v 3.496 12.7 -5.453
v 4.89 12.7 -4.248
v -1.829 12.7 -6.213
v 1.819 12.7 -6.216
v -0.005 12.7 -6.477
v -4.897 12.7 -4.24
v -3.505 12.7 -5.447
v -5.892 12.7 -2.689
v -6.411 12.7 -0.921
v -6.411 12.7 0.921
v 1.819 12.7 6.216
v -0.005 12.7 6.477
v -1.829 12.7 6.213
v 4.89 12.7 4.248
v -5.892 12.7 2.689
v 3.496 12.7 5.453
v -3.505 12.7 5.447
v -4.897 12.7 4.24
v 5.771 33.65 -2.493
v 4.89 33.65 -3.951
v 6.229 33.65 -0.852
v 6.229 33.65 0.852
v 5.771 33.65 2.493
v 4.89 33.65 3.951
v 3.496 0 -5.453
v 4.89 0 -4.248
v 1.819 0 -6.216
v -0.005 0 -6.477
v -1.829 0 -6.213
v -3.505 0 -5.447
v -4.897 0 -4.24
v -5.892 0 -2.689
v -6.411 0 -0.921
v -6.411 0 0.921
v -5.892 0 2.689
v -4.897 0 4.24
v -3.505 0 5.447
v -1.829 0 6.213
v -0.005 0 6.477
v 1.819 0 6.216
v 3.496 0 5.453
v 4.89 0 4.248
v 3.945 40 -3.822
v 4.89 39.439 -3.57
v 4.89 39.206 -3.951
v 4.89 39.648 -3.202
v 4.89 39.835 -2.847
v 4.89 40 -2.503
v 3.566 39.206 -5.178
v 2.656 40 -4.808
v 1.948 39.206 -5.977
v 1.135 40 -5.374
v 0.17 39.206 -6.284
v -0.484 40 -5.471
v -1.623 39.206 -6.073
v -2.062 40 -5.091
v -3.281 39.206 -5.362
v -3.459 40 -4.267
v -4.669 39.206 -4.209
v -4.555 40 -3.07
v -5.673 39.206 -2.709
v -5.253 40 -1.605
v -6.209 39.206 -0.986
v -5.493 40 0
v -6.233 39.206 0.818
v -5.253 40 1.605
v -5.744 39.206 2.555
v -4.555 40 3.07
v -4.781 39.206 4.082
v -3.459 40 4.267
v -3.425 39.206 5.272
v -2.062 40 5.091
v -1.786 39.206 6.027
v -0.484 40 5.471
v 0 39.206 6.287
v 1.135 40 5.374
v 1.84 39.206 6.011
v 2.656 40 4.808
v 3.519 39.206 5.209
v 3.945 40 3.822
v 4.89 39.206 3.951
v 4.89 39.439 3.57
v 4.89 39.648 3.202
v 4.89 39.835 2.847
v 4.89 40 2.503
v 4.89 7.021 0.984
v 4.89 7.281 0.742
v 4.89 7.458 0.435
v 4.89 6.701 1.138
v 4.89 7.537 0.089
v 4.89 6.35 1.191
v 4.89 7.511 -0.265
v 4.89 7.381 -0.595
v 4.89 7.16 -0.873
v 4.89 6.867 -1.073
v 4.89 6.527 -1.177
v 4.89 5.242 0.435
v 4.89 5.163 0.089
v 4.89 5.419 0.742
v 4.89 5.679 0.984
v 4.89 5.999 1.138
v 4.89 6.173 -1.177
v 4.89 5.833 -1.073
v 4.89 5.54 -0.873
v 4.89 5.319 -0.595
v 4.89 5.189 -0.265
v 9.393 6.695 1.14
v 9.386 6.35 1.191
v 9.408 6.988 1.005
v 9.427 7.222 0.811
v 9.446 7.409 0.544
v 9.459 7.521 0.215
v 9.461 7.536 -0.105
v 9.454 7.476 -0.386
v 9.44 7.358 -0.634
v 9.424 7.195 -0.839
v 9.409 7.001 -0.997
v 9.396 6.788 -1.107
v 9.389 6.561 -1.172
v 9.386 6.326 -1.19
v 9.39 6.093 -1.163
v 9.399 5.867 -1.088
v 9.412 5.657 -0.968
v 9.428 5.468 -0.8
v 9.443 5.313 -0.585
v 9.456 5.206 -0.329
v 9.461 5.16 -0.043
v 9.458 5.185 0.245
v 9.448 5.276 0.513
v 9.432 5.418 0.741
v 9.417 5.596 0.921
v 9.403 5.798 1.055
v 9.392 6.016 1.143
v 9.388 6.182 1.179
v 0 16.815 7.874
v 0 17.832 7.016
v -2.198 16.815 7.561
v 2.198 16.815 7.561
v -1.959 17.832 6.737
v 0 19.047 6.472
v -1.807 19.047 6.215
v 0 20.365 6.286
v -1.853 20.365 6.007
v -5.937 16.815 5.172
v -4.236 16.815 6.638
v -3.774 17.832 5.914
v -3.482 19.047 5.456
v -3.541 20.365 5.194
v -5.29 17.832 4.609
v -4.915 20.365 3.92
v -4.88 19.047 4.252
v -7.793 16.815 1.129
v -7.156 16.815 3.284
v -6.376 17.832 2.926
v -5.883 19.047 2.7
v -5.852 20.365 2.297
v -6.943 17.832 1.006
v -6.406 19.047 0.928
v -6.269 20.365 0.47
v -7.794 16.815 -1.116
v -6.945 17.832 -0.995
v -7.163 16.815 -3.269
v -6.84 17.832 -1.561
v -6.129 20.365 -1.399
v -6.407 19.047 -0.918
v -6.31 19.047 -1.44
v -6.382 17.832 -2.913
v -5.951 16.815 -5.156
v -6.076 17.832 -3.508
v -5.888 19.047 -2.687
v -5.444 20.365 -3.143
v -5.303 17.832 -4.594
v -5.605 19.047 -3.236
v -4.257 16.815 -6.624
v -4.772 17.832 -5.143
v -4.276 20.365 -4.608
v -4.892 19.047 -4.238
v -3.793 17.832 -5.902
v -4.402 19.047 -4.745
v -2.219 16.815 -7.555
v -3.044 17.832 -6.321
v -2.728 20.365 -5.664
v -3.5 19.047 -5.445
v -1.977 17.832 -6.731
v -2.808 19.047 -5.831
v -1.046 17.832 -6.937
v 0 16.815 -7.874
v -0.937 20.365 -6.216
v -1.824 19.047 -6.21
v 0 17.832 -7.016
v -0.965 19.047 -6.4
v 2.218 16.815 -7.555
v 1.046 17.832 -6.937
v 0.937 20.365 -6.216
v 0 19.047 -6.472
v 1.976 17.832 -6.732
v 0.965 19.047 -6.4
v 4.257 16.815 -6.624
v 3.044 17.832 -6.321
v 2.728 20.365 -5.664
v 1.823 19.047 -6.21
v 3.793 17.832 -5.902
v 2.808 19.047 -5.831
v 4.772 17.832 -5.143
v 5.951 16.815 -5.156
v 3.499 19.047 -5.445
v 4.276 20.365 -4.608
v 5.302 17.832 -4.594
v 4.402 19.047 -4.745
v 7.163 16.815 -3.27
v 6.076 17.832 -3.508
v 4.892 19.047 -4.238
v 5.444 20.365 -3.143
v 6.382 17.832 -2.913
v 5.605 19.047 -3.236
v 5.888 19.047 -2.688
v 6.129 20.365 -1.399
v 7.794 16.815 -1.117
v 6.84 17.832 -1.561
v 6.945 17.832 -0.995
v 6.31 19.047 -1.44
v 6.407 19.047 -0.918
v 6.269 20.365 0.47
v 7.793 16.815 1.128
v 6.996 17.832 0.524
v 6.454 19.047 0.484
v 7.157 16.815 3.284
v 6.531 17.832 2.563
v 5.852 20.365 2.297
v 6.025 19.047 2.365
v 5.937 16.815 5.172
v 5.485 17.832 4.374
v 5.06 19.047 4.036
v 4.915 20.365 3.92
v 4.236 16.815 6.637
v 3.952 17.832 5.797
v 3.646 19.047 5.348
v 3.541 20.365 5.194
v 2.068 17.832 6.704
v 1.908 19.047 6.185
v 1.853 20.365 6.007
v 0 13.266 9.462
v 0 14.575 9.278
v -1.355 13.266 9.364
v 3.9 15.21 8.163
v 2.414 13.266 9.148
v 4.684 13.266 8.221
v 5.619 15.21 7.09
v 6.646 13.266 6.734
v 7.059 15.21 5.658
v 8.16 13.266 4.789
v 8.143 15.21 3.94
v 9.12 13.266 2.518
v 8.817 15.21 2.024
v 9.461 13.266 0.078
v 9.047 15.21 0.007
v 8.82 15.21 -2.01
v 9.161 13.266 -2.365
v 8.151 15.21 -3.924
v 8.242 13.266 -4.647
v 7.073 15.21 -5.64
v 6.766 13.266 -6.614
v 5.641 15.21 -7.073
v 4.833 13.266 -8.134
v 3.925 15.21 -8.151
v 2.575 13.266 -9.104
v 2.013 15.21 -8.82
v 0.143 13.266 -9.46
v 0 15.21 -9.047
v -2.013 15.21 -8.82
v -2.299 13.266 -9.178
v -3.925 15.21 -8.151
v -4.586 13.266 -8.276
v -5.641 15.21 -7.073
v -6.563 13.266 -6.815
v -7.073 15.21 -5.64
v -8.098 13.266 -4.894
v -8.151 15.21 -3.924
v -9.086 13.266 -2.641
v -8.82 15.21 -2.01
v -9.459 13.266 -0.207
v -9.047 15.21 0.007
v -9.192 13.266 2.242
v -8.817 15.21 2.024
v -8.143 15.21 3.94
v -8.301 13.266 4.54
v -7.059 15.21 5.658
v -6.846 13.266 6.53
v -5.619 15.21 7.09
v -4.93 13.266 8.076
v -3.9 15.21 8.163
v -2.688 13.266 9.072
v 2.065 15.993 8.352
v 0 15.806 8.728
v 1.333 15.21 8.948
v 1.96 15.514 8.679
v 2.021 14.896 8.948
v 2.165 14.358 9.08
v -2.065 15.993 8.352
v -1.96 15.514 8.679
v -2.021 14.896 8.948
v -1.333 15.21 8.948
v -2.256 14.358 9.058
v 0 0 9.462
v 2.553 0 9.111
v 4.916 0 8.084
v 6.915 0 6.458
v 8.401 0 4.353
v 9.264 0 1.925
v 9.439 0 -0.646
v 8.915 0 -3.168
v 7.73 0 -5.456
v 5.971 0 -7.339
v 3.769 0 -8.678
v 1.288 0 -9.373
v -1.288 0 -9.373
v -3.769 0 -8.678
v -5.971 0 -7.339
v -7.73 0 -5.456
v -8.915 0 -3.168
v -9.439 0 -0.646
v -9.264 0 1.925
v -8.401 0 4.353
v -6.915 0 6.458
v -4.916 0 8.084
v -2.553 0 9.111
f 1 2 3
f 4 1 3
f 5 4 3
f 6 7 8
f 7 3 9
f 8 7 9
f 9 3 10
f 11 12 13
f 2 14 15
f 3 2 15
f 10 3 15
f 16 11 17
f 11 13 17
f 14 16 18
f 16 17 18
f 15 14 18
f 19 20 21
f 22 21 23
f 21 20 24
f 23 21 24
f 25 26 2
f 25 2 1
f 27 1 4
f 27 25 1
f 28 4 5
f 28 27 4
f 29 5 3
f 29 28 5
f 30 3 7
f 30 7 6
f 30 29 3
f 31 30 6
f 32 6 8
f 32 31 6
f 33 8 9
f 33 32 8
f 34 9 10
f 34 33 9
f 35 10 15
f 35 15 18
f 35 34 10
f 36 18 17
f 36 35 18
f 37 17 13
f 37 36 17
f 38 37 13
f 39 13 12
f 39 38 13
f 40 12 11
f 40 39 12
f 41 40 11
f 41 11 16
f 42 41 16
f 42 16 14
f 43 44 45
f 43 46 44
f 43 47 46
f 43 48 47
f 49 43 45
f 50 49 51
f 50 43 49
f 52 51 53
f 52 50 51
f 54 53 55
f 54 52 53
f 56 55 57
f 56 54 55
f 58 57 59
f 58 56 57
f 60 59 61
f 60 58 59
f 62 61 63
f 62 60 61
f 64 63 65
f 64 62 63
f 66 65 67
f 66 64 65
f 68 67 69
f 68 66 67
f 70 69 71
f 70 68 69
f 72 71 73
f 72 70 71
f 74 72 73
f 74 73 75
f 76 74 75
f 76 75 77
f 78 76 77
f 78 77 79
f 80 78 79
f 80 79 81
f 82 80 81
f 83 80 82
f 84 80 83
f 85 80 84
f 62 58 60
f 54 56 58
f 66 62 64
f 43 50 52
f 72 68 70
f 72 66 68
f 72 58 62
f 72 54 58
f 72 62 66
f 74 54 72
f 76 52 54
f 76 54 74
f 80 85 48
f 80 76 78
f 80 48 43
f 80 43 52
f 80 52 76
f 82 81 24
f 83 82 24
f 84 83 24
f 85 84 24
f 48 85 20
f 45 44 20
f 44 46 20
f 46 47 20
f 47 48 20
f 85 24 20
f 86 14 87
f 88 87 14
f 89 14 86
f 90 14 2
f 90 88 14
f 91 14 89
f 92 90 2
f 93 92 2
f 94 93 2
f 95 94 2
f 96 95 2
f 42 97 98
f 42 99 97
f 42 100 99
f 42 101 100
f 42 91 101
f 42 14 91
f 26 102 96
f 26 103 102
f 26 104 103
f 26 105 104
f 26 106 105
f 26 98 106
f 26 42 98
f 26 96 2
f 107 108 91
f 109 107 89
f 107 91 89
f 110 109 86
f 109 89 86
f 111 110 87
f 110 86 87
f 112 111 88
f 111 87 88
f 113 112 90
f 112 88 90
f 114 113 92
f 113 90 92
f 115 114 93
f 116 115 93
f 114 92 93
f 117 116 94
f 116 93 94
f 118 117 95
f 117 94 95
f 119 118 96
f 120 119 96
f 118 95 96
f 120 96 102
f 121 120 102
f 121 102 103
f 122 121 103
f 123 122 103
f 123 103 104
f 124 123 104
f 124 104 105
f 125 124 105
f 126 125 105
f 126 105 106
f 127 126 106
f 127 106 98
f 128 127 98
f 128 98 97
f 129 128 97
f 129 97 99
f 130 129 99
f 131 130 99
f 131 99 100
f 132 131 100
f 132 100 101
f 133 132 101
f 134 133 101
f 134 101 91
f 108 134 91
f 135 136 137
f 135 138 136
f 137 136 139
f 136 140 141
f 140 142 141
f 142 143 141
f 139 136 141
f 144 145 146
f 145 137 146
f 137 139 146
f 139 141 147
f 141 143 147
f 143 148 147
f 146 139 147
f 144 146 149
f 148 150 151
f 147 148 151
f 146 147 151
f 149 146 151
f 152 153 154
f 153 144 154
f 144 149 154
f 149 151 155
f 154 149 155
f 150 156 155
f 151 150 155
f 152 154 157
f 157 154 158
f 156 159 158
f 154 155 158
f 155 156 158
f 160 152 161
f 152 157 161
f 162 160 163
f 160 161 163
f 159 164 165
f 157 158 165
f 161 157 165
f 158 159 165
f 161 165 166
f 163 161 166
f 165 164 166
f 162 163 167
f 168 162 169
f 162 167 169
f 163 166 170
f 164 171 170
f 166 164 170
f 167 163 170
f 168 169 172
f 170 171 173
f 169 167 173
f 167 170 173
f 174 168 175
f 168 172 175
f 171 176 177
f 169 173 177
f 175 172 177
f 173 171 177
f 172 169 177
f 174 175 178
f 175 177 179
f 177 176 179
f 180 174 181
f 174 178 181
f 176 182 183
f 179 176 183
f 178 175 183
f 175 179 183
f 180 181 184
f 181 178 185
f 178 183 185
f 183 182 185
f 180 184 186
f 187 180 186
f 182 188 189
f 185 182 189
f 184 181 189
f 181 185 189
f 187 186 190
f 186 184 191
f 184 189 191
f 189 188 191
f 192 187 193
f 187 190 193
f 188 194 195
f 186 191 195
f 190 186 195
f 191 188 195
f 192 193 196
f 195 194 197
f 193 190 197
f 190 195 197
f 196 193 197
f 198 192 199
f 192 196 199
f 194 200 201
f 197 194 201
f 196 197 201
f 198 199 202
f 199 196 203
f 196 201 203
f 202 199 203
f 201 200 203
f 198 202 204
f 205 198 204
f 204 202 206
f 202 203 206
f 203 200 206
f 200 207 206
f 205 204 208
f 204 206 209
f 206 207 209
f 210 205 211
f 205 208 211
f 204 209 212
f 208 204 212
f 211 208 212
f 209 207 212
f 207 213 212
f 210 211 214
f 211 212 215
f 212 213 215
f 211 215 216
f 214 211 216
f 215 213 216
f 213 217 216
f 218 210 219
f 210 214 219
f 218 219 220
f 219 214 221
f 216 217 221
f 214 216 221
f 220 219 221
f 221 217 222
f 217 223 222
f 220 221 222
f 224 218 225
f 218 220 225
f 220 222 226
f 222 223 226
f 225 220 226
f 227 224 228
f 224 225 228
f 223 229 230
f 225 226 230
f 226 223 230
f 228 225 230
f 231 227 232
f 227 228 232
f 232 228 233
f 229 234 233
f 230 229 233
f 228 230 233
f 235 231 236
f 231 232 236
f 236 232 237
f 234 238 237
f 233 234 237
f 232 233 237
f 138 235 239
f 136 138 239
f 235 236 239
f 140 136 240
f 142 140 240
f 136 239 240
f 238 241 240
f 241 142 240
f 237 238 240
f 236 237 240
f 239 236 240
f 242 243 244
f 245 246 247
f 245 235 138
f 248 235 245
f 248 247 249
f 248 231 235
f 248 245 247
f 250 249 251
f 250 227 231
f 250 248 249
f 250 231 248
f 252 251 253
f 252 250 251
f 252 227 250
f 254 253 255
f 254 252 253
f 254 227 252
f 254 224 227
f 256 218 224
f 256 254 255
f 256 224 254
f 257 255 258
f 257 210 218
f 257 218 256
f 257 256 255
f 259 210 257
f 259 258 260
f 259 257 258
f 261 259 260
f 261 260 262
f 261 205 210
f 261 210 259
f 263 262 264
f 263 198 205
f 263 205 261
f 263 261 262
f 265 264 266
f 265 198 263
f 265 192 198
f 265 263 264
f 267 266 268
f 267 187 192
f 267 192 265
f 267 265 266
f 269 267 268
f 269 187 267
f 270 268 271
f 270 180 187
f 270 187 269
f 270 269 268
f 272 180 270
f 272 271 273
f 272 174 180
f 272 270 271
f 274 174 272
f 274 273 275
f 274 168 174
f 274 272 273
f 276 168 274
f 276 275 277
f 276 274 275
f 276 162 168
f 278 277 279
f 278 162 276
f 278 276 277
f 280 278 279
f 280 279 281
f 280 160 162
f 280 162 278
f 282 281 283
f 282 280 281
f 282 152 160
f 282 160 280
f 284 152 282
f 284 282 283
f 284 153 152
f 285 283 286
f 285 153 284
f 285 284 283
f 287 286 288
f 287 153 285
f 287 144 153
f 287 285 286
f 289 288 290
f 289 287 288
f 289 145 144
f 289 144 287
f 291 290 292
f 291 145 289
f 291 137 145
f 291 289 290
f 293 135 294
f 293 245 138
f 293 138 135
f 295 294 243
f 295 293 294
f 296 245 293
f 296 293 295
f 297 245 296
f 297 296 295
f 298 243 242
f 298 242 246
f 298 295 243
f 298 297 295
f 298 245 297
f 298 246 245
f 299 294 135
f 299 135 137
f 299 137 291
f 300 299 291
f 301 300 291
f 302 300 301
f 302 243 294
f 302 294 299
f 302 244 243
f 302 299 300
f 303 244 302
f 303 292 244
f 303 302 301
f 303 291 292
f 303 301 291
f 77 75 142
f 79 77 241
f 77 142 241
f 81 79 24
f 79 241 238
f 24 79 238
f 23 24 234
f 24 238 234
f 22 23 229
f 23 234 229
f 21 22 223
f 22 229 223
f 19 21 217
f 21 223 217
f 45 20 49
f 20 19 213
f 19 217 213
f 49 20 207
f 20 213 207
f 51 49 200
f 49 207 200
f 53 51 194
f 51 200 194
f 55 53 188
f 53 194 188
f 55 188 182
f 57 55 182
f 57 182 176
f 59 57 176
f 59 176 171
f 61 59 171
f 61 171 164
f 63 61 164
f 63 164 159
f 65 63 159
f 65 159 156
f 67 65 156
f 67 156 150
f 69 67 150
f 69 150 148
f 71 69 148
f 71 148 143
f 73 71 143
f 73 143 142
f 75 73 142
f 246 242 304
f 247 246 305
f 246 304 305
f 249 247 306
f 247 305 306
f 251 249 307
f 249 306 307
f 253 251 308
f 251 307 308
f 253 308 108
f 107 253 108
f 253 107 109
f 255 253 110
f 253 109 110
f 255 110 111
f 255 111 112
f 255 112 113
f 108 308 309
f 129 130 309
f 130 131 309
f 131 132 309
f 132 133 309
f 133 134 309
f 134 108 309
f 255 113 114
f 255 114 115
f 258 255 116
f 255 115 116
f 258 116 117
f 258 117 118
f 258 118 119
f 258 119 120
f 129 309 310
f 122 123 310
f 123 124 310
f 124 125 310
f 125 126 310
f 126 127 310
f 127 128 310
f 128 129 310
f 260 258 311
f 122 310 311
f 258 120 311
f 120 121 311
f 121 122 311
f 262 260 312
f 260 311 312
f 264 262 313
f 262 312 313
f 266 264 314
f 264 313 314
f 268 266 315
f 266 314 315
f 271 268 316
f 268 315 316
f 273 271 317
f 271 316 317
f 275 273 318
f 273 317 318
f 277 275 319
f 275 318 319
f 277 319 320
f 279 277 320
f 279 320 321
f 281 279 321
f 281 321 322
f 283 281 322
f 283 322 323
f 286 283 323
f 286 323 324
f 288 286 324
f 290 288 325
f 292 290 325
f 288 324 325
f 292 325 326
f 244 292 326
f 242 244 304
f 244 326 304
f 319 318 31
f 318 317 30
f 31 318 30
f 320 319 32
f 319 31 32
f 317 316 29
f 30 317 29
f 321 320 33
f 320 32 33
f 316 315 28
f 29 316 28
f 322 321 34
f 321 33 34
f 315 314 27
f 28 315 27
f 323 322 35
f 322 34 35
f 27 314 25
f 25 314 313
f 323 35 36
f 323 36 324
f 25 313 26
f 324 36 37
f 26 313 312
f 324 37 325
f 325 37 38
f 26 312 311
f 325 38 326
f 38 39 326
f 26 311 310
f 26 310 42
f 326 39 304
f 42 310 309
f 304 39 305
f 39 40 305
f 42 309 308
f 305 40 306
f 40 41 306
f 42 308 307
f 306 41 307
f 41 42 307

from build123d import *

# Parameters (mm, degrees)
SKETCH1_R           = 6.2865
BASE_EXTRUDE_DEPTH  = 40
SKETCH3_R           = 9.4615
BOSS_EXTRUDE1_DEPTH = 15.875
CUT_EXTRUDE1_DEPTH  = 12.7
FILLET1_R           = 4.7625
FILLET2_R           = 4.7625
SKETCH5_R           = 1.190625
CUT_EXTRUDE2_DEPTH  = 44.537009406
CUT_EXTRUDE3_START  = -6.35
CUT_EXTRUDE3_DEPTH  = 6.35
CHAMFER1_SIZE       = 0.79375


with BuildPart() as part:
    # Sketch1 → Base-Extrude (new body)
    with BuildSketch(Plane(origin=(0, 0, 0), x_dir=(-1, 0, 0), z_dir=(0, 1, 0))):
        with Locations(Location((0, 0, 0), (0, 0, 90))):
            Circle(SKETCH1_R)
    extrude(amount=BASE_EXTRUDE_DEPTH)

    # Sketch3 → Boss-Extrude1 (add)
    with BuildSketch(Plane(origin=(0, 0, 0), x_dir=(-1, 0, 0), z_dir=(0, 1, 0))):
        with Locations(Location((0, 0, 0), (0, 0, 90))):
            Circle(SKETCH3_R)
    extrude(amount=BOSS_EXTRUDE1_DEPTH)

    # Sketch4 → Cut-Extrude1 (cut)
    with BuildSketch(Plane(origin=(0, 0, 0), x_dir=(-1, 0, 0), z_dir=(0, 1, 0))):
        with BuildLine():
            Line((-4.8895, 4.247860491), (-4.8895, -4.247860491))
            ThreePointArc((-4.8895, -4.247860491), (6.477, 0), (-4.8895, 4.247860491))
        make_face()
    extrude(amount=CUT_EXTRUDE1_DEPTH, mode=Mode.SUBTRACT)

    # Fillet1
    # the kernel refuses this fillet: 4.7625 mm, written as the material it adds along each edge
    with BuildSketch(Plane(origin=(0, 15.875, 0), x_dir=(0, 0, 1), z_dir=(1, 0, 0))) as fillet1_piece_1:
        with BuildLine():
            CenterArc((11.049, -4.490128061), FILLET1_R, 109.471220634, 70.528779366)
            Line((6.2865, -4.490128061), (6.19125, -4.490128061))
            Line((6.19125, -4.490128061), (6.19125, 0))
            Line((6.19125, 0), (6.2865, 0.09525))
            ThreePointArc((6.2865, 0.09525), (7.874, 0.09525), (9.42975, 0.089802561))
            Line((9.42975, 0.089802561), (9.4615, 0))
        make_face()
    revolve(axis=Axis((0, 15.875, 0), (0, -1, 0)))

    # Fillet2
    fillet2_edges = [part.edges().sort_by_distance(p)[0] for p in [
        (0, 15.875, -9.4615),
    ]]
    fillet(fillet2_edges, radius=FILLET2_R)

    # Sketch5 → Cut-Extrude2 (cut, through all)
    with BuildSketch(Plane.ZY.offset(-4.8895)):
        with Locations((0, 6.35)):
            Circle(SKETCH5_R)
    extrude(amount=-CUT_EXTRUDE2_DEPTH, mode=Mode.SUBTRACT)

    # Sketch7 → Cut-Extrude3 (cut)
    with BuildSketch(Plane(origin=(0, 40, 0), x_dir=(-1, 0, 0), z_dir=(0, 1, 0)).offset(CUT_EXTRUDE3_START)):
        with BuildLine():
            Line((-4.8895, 3.951312693), (-4.8895, -3.951312693))
            ThreePointArc((-4.8895, -3.951312693), (-6.2865, 0), (-4.8895, 3.951312693))
        make_face()
    extrude(amount=CUT_EXTRUDE3_DEPTH, mode=Mode.SUBTRACT)

    # Chamfer1
    chamfer1_edges = [part.edges().sort_by_distance(p)[0] for p in [
        (-5.67274226, 40, -2.70925774),
    ]]
    chamfer(chamfer1_edges, length=CHAMFER1_SIZE)


solid = part.part
